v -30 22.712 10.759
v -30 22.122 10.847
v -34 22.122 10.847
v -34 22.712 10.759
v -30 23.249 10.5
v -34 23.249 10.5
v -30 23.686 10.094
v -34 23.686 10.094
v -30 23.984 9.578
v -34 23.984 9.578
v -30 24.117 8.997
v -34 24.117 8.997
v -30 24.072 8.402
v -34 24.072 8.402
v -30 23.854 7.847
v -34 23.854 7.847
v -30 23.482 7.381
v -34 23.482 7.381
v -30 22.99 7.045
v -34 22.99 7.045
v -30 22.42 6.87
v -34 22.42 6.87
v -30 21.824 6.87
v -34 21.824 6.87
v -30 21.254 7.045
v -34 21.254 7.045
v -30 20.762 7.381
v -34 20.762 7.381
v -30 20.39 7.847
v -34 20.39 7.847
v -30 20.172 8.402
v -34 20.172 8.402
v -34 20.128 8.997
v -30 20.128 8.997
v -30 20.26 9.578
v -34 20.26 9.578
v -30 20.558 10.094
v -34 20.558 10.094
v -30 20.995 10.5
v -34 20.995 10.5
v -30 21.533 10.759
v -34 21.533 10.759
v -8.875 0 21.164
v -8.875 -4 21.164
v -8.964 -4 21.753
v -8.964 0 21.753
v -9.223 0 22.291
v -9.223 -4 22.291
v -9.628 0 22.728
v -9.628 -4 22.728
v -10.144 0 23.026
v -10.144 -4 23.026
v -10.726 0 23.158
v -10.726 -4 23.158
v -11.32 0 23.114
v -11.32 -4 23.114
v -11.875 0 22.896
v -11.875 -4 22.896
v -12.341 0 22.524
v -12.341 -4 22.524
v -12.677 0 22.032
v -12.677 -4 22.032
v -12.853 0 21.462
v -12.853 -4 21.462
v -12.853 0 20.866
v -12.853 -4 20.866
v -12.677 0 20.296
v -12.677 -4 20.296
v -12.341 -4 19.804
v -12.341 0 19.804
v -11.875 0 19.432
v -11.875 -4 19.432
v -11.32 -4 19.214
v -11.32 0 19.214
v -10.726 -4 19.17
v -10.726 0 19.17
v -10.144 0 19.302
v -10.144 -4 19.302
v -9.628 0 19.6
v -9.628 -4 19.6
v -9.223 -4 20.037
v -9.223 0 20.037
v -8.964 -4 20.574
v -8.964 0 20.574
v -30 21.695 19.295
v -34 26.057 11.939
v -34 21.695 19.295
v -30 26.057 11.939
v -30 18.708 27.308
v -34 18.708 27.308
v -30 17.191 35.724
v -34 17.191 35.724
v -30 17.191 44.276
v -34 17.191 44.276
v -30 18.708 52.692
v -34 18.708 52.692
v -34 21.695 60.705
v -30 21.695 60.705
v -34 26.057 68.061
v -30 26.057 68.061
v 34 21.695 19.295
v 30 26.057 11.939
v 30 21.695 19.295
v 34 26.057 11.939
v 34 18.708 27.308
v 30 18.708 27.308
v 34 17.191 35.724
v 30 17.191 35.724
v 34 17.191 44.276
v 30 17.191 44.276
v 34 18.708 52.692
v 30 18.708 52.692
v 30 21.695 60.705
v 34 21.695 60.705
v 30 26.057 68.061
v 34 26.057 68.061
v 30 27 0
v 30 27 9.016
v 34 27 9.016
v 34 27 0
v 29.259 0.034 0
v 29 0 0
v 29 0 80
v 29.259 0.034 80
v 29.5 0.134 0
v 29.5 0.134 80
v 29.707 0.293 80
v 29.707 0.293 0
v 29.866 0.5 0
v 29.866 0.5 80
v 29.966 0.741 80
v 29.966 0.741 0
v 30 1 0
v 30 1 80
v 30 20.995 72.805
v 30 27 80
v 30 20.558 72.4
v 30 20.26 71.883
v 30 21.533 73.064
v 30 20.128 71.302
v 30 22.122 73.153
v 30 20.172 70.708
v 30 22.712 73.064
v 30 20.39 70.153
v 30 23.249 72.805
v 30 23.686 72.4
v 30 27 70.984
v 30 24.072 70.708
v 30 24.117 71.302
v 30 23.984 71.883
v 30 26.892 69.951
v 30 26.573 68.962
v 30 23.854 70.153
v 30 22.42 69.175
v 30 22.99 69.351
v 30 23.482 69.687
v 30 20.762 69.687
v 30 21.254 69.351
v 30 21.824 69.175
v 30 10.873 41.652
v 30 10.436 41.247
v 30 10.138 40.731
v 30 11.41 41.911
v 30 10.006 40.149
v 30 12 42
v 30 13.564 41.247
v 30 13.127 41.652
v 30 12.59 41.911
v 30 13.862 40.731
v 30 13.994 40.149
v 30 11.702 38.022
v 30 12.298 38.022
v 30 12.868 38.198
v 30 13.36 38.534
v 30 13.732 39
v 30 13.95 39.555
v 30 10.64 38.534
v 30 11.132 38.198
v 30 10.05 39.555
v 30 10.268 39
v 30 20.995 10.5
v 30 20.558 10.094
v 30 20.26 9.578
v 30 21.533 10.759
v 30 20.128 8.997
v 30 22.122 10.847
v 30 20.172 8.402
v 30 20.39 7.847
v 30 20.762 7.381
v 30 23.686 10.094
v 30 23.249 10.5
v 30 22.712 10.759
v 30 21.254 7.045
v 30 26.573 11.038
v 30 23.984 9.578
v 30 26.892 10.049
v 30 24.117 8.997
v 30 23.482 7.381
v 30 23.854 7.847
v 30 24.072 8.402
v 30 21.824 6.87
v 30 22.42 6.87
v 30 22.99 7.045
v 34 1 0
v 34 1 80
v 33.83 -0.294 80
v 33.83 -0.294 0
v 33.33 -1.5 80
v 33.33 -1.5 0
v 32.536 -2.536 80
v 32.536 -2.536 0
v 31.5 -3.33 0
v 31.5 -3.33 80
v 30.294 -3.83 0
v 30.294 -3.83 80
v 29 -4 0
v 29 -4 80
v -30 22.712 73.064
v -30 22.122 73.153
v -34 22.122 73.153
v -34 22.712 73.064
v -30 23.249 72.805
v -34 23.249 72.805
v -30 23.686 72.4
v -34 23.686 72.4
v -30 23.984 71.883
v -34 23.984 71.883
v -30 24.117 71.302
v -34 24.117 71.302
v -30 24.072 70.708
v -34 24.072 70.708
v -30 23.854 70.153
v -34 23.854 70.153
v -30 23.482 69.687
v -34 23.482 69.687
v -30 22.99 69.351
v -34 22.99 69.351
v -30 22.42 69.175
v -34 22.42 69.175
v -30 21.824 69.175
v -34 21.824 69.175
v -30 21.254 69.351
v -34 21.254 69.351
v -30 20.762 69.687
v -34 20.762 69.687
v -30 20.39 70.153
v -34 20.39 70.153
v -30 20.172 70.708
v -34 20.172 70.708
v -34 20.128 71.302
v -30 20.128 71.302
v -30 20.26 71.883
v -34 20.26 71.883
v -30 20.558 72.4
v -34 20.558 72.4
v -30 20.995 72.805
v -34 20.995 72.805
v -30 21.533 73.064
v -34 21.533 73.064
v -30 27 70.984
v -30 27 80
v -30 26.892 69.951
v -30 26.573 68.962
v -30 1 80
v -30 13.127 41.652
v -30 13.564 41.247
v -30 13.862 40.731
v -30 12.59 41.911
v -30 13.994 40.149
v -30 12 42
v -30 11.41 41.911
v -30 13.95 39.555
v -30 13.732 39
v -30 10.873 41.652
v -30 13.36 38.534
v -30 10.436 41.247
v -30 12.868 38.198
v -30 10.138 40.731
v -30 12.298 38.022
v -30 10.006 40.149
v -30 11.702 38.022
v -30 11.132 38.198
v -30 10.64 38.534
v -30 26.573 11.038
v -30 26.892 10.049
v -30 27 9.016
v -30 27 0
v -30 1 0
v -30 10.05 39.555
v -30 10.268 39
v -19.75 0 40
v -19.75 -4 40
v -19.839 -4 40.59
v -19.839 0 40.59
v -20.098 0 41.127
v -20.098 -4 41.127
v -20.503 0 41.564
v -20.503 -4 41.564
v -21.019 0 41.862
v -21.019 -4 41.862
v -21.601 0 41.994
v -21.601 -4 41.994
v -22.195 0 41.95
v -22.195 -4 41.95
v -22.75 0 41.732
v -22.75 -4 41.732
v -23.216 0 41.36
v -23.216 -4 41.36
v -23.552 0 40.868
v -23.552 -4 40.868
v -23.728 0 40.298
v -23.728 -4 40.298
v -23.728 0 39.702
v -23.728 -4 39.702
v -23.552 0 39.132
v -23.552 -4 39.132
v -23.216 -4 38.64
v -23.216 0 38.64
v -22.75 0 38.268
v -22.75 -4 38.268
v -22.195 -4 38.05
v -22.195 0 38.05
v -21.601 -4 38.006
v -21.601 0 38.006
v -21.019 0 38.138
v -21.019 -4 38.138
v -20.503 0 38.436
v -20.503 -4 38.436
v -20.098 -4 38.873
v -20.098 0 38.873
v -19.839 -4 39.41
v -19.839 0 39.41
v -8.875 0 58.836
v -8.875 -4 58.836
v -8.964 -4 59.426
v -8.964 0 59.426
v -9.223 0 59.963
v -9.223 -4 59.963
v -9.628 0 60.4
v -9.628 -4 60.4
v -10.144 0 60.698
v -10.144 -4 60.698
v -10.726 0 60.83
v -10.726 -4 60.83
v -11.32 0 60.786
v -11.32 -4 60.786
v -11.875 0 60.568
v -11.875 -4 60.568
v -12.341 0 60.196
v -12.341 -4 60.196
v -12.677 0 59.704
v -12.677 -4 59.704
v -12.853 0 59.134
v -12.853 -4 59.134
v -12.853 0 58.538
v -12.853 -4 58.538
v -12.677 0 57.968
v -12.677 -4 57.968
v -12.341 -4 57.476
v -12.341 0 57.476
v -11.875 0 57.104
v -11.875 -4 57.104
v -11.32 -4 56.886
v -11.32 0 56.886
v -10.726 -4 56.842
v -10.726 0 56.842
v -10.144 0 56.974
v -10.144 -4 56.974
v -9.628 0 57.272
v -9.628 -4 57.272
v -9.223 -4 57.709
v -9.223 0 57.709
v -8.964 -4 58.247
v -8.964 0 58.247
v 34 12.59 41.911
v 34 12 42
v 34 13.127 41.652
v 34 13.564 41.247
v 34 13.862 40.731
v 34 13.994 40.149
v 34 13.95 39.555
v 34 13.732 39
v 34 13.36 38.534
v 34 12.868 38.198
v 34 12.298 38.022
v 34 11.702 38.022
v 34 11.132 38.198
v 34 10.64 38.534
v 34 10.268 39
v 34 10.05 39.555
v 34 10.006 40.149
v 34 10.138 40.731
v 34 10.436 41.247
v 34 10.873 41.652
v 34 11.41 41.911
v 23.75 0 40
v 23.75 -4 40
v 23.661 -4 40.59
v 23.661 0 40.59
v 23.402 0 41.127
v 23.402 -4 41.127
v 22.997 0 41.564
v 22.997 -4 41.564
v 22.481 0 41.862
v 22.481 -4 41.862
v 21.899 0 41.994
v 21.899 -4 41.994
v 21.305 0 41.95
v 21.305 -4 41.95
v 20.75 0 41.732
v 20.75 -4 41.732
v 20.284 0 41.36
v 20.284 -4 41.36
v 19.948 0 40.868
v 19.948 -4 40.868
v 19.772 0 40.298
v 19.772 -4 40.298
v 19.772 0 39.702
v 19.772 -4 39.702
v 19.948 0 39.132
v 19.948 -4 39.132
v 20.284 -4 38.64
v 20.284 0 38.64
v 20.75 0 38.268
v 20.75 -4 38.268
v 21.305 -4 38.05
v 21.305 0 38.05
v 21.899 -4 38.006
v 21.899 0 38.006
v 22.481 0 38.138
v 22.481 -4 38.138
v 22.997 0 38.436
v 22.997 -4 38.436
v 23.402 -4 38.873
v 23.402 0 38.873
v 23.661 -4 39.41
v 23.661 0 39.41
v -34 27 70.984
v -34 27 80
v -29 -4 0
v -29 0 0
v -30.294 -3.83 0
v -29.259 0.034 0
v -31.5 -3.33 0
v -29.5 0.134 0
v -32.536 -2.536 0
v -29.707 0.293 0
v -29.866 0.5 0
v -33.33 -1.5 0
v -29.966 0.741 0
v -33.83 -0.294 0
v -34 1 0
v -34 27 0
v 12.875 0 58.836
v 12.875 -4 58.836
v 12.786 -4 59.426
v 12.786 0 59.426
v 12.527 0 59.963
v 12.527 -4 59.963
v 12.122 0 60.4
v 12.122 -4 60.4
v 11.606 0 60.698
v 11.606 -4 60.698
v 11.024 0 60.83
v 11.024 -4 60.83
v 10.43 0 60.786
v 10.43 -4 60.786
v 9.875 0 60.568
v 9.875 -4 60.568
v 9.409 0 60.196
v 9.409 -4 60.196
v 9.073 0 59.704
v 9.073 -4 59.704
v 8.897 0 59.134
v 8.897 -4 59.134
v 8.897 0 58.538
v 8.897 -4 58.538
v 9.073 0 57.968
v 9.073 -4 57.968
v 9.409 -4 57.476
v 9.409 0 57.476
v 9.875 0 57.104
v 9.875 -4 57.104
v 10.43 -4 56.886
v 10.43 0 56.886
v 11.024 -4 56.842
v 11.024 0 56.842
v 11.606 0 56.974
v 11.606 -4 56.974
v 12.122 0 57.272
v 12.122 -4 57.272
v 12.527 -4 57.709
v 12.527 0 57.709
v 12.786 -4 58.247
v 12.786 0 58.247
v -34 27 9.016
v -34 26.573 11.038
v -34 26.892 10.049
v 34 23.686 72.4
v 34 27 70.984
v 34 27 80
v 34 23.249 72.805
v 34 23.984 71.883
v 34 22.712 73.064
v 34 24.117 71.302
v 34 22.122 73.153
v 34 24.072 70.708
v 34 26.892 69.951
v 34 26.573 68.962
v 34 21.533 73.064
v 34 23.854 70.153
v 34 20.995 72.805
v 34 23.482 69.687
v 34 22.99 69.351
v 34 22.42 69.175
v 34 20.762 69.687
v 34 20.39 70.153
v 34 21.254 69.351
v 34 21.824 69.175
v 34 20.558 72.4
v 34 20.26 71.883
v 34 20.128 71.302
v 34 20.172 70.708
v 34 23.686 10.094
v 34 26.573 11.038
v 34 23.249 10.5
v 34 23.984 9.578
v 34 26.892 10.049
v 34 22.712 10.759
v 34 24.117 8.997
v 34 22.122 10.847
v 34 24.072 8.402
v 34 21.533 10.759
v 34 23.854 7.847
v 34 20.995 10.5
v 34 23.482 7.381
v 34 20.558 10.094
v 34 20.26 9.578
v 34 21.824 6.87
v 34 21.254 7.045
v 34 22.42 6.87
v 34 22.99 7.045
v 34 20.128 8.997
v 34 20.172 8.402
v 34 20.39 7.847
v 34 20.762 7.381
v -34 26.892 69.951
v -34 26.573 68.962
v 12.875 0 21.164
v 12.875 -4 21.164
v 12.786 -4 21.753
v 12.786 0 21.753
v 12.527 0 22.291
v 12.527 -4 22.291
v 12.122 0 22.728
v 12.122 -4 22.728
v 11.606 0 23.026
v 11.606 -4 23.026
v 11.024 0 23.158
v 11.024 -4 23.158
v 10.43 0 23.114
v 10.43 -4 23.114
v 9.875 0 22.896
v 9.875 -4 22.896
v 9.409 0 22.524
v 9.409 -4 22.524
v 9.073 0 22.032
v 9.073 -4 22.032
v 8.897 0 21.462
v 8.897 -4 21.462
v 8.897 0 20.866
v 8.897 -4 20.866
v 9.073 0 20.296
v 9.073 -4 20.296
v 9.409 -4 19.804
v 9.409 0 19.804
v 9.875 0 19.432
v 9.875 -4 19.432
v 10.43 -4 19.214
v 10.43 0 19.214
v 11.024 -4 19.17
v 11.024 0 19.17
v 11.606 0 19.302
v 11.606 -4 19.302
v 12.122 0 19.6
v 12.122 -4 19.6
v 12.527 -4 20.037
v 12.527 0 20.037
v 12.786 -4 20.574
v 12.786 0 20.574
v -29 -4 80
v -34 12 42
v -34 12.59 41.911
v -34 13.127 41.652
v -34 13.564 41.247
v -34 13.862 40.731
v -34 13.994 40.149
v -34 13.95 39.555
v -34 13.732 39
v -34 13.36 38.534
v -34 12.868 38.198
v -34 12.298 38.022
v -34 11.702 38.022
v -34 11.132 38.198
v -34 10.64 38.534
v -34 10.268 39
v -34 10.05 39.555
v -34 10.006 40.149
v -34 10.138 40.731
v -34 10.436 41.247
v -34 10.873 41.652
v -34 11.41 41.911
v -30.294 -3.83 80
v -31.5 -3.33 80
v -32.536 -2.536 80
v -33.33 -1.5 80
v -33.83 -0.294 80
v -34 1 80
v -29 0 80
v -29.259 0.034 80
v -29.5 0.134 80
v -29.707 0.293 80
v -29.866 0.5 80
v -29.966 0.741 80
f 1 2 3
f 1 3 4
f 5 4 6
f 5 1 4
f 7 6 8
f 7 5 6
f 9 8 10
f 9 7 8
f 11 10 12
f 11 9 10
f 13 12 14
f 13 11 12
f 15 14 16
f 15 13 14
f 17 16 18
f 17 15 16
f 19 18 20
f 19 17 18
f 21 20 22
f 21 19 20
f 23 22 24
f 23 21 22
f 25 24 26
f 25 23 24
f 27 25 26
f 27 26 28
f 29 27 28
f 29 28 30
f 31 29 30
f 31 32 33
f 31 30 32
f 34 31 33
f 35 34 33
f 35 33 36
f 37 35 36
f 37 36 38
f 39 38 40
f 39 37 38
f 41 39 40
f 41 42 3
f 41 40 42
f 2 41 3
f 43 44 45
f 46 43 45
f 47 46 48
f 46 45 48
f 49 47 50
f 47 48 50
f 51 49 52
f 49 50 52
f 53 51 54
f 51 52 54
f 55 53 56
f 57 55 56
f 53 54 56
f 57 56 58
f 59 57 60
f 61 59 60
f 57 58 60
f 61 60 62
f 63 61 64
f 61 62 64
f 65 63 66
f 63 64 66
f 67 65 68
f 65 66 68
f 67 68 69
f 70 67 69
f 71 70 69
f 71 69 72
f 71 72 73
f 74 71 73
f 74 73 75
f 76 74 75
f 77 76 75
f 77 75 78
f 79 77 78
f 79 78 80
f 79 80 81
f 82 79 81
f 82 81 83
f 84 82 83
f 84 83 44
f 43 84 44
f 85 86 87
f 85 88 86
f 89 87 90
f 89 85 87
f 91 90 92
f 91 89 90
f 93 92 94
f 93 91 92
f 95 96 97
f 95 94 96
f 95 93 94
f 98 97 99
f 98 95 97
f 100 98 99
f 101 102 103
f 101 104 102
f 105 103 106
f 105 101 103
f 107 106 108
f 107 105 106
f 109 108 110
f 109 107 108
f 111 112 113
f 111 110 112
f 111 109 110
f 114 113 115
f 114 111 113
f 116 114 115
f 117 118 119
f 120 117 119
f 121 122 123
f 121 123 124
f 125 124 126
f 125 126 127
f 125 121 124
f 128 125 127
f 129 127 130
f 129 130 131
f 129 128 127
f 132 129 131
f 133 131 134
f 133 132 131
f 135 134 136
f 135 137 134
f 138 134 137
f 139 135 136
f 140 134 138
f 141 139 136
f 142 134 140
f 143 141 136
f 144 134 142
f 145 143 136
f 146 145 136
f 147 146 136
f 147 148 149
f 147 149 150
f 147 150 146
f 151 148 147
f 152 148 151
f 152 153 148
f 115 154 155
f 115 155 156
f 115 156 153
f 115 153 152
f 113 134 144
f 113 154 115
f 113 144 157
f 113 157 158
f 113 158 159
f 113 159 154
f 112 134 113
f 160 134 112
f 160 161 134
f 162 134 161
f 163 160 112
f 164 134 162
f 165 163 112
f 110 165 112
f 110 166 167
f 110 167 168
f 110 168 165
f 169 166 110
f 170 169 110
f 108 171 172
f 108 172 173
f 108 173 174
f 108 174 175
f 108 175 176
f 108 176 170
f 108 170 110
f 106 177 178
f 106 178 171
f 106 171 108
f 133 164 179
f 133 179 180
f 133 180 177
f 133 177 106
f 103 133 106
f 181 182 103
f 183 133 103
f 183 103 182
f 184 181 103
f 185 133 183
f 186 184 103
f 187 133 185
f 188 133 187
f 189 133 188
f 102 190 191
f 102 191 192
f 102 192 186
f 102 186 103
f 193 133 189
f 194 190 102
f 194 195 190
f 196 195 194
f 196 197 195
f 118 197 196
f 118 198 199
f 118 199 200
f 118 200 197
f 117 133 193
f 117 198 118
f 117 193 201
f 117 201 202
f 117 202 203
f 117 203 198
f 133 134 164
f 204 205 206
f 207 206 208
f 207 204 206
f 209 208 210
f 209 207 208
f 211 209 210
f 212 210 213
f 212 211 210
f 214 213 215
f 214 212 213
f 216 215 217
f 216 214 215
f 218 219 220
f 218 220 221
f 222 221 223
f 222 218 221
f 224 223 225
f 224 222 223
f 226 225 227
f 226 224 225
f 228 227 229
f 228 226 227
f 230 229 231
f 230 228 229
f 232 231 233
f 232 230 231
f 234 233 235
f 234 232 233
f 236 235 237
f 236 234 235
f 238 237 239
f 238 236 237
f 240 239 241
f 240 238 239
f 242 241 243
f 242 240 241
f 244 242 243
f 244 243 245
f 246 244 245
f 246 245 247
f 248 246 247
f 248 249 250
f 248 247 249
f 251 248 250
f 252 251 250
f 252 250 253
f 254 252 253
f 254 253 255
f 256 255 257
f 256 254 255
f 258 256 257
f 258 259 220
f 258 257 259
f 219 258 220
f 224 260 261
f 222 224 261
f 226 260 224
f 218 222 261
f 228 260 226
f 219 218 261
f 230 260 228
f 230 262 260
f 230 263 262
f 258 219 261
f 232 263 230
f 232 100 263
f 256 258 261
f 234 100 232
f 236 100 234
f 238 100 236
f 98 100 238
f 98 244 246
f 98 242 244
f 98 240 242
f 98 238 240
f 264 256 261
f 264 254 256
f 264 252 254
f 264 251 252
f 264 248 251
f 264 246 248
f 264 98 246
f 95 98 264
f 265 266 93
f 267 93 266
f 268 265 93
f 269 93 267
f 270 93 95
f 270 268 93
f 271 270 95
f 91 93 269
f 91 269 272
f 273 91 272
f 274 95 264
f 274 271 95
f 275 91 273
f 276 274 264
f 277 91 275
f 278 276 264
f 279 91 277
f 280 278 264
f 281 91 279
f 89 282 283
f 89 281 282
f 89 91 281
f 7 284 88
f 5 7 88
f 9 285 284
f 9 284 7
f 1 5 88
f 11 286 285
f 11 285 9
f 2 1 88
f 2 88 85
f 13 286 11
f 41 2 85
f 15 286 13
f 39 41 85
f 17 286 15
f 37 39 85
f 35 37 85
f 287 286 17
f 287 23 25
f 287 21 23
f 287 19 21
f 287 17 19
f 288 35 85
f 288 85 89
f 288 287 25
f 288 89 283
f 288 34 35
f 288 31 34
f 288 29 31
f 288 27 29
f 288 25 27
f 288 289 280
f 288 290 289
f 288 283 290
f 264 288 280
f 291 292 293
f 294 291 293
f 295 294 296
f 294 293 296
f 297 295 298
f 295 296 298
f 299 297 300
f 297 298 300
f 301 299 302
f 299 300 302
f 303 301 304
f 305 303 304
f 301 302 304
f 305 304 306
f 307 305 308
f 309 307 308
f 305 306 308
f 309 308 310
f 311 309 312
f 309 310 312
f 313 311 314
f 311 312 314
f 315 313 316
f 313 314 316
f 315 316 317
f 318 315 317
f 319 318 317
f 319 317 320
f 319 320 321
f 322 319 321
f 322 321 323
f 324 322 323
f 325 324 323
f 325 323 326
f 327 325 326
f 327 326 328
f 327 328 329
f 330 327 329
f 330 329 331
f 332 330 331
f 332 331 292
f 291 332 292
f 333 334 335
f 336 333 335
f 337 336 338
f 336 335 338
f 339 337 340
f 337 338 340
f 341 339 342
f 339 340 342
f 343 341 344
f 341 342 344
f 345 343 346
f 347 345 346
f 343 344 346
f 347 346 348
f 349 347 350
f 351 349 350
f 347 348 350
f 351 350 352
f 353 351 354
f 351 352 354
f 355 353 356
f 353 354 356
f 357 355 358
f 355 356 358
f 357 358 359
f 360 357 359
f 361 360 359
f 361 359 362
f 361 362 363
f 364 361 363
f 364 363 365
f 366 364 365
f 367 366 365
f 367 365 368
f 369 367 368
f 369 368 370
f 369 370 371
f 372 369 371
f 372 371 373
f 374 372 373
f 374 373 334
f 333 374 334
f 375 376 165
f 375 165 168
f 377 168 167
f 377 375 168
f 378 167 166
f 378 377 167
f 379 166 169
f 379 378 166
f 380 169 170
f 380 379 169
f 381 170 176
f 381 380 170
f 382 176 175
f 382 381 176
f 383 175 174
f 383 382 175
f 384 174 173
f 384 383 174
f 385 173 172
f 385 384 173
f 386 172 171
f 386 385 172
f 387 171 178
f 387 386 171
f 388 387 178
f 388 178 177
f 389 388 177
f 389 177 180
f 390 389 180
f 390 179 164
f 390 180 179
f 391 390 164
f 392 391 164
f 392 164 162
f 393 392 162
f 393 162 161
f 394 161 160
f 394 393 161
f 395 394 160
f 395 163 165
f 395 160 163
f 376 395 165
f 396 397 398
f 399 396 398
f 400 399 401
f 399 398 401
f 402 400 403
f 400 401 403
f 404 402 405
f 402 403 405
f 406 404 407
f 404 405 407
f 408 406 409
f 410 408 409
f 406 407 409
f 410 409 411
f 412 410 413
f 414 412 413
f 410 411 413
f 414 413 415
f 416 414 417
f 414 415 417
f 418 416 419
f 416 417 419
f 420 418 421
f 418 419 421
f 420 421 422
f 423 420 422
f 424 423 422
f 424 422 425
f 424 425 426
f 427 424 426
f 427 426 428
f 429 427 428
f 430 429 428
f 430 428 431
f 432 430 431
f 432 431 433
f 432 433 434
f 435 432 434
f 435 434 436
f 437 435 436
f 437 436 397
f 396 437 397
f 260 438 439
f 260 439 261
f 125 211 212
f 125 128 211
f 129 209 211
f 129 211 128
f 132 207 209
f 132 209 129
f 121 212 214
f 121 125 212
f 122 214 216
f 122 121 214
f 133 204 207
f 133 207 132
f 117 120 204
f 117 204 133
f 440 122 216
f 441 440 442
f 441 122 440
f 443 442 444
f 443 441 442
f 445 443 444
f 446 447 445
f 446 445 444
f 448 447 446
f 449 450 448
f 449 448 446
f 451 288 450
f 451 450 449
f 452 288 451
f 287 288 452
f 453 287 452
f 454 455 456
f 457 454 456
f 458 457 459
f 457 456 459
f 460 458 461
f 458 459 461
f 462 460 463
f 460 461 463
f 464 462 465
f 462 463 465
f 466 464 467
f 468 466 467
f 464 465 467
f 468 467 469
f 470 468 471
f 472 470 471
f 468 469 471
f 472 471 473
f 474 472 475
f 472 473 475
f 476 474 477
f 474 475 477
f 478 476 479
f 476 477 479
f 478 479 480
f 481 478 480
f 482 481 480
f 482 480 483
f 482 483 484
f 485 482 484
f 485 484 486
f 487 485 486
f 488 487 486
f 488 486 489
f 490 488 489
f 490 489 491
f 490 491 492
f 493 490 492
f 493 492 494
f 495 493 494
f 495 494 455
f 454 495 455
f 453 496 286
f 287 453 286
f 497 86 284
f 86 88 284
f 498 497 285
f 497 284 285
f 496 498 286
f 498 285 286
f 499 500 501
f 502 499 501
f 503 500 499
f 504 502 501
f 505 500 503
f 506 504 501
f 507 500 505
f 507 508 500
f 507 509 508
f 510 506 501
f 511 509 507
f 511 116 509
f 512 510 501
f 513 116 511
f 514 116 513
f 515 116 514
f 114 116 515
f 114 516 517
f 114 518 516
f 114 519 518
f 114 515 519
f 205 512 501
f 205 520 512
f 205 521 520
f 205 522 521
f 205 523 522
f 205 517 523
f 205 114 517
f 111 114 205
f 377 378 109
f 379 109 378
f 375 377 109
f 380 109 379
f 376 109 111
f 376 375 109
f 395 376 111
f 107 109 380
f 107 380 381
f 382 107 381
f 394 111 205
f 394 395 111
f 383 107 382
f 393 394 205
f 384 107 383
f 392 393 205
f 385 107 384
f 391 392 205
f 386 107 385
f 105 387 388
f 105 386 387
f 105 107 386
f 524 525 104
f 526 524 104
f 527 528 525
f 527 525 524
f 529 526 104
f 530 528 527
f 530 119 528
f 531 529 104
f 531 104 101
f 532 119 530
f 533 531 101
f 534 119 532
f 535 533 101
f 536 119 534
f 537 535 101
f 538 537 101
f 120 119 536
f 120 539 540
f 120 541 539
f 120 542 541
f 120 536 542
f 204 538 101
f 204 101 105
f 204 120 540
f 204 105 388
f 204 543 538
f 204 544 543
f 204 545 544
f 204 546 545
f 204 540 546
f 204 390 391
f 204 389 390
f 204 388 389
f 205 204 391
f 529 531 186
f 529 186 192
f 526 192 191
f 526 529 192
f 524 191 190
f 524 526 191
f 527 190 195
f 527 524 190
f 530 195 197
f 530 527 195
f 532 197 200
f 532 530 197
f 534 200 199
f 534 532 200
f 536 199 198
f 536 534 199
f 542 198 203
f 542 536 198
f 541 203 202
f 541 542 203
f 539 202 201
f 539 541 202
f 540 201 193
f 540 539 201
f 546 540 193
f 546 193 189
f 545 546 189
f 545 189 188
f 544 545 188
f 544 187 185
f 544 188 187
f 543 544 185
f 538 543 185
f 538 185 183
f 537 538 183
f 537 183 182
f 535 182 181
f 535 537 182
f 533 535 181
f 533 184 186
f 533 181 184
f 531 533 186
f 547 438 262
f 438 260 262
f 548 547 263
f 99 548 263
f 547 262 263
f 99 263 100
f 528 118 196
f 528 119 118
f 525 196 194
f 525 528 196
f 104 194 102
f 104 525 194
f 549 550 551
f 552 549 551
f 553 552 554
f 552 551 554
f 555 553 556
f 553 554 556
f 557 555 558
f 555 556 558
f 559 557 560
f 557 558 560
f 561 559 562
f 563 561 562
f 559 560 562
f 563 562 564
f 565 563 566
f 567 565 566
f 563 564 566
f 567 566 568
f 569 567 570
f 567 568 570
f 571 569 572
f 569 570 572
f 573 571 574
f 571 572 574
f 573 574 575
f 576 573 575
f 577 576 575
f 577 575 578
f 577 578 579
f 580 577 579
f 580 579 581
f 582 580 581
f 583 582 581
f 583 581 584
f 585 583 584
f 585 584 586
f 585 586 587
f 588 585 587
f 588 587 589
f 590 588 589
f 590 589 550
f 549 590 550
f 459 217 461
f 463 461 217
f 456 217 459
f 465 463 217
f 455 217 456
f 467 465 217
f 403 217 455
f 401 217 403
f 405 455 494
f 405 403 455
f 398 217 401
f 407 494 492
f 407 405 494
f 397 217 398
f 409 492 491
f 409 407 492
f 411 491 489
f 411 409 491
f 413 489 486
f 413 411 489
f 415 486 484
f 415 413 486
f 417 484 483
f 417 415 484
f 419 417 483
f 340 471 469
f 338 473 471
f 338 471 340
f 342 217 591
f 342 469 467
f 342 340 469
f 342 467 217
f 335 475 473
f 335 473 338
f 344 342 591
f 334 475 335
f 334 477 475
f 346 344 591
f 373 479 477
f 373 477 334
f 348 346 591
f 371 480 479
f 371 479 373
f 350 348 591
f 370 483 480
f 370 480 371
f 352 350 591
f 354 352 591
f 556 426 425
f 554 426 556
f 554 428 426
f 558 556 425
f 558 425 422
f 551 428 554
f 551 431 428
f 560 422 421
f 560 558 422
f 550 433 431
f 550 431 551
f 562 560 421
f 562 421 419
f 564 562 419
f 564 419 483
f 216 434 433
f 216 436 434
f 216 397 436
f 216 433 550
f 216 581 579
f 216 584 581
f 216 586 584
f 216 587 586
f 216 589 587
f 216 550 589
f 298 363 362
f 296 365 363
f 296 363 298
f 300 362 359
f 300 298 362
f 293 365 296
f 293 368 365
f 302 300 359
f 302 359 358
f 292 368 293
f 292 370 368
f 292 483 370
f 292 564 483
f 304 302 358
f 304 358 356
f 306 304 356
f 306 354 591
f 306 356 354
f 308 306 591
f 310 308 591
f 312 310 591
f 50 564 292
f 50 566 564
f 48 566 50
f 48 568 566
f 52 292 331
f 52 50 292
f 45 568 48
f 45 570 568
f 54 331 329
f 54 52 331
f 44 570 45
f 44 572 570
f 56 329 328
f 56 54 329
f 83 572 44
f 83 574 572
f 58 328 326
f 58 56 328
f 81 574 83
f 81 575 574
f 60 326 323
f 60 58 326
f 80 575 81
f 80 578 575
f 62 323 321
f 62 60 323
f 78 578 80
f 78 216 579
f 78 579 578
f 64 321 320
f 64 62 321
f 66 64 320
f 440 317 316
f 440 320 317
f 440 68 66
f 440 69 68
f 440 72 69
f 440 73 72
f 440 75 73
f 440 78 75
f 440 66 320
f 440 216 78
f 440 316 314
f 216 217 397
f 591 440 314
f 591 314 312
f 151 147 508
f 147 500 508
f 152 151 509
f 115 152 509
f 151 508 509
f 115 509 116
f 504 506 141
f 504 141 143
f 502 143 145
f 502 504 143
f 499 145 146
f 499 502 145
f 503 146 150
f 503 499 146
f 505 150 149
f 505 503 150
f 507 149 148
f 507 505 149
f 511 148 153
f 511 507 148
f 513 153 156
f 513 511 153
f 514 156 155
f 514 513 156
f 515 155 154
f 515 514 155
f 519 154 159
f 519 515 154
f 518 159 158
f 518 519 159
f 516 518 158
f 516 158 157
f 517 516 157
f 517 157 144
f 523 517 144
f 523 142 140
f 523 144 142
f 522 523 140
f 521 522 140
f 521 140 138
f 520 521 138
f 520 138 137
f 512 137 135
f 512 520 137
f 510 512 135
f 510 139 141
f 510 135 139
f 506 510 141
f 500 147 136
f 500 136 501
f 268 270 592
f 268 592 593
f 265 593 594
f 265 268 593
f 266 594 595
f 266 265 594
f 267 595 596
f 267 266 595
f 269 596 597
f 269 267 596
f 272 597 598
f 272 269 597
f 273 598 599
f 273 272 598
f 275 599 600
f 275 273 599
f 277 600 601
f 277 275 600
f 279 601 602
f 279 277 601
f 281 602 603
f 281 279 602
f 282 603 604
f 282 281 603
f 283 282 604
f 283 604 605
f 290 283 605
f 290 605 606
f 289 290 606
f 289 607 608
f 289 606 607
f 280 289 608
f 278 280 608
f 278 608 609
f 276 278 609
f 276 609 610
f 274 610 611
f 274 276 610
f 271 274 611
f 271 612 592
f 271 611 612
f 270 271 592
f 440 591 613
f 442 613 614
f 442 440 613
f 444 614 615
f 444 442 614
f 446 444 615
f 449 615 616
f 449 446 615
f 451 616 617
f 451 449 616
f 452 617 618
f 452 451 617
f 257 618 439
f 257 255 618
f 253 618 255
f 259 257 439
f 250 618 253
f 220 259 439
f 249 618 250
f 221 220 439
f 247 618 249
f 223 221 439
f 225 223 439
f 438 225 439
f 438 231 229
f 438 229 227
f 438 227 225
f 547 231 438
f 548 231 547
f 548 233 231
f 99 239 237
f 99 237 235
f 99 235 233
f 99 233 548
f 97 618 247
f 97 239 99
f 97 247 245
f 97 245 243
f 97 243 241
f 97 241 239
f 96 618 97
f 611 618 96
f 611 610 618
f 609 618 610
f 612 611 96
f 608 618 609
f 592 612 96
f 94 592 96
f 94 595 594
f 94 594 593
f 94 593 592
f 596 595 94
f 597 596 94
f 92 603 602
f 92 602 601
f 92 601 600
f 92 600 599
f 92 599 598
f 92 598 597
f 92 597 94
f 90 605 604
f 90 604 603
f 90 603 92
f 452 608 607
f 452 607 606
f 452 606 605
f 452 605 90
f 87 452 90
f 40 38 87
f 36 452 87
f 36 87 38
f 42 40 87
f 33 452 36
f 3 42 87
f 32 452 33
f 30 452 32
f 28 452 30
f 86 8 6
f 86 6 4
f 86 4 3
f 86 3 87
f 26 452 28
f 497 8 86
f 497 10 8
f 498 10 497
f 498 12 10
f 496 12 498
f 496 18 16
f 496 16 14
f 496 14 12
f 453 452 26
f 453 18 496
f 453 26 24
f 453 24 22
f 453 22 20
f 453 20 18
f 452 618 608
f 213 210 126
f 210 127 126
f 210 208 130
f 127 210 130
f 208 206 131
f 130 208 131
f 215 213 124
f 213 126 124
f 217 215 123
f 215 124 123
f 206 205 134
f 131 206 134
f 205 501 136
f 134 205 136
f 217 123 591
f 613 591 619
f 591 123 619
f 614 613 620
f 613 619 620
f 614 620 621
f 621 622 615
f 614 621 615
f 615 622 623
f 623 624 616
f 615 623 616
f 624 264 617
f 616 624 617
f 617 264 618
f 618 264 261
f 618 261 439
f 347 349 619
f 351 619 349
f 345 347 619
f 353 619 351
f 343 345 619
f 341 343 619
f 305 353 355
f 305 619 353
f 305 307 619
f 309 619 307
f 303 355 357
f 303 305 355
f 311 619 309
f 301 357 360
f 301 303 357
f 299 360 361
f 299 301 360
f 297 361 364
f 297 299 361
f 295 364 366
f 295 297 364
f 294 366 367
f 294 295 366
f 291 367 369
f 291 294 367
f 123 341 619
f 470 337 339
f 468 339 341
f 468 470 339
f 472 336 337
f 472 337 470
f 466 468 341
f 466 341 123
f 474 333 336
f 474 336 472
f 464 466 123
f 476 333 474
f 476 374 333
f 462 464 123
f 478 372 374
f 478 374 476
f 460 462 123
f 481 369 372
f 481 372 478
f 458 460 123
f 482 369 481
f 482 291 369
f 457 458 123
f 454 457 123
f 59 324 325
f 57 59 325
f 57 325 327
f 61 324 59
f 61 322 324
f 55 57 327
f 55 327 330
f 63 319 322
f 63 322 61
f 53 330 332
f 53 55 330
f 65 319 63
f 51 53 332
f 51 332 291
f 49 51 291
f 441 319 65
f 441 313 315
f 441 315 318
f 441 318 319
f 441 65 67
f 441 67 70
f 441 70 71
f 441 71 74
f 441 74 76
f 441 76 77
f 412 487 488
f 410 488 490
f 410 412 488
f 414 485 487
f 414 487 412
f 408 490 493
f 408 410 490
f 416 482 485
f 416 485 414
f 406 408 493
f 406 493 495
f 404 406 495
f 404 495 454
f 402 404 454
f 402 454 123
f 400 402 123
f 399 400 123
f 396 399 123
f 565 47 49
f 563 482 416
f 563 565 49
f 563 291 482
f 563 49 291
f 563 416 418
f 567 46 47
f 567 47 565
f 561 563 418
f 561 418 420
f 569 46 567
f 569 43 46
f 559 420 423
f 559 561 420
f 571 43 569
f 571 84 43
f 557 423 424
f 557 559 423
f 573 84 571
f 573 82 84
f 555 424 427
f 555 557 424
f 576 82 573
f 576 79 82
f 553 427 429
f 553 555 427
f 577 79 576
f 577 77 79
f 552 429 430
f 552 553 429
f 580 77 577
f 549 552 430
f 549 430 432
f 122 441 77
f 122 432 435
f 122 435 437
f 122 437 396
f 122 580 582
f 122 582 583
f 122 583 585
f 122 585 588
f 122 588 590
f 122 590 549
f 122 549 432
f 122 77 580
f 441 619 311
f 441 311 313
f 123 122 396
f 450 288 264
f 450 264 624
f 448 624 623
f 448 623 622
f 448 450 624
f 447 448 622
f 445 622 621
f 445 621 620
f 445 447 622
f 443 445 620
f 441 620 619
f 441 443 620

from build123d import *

# Parameters (mm, degrees)
SM_BASE_FLANGE_1_DEPTH   = 80
CUT_EXTRUDE_3_DEPTH      = 109.411254028
CUT_EXTRUDE_3_DEPTH_BACK = 109.411254028
SKETCH_6_R               = 48
SKETCH_6_R_2             = 2
FILLET_1_R               = 5
SKETCH_9_R               = 2
CUT_EXTRUDE_4_DEPTH      = 93.287593966


# Sheet-metal steps are written as plain solids
with BuildPart() as part:
    # Sketch 1 → Базовая кромка1 (new body)
    with BuildSketch(Plane.XY):
        with BuildLine():
            Line((-30, 27), (-30, 1))
            ThreePointArc((-30, 1), (-29.707106781, 0.292893219), (-29, 0))
            Line((-29, 0), (29, 0))
            ThreePointArc((29, 0), (29.707106781, 0.292893219), (30, 1))
            Line((30, 1), (30, 27))
            Line((30, 27), (34, 27))
            Line((34, 27), (34, 1))
            ThreePointArc((34, 1), (32.535533906, -2.535533906), (29, -4))
            Line((29, -4), (-29, -4))
            ThreePointArc((-29, -4), (-32.535533906, -2.535533906), (-34, 1))
            Line((-34, 1), (-34, 27))
            Line((-34, 27), (-30, 27))
        make_face()
    extrude(amount=SM_BASE_FLANGE_1_DEPTH)

    # Эскиз6 → Вырез-Вытянуть3 (cut, two sides: drawn at the far end of the back side and taken through both)
    with BuildSketch(Plane.ZY.offset(34).offset(-CUT_EXTRUDE_3_DEPTH_BACK)):
        with Locations((40, 65)):
            Circle(SKETCH_6_R)
        with Locations((40, 12)):
            Circle(SKETCH_6_R_2)
        with Locations((8.847381628, 22.122099298)):
            Circle(SKETCH_6_R_2)
        with Locations((71.152618372, 22.122099298)):
            Circle(SKETCH_6_R_2)
    extrude(amount=CUT_EXTRUDE_3_DEPTH + CUT_EXTRUDE_3_DEPTH_BACK, mode=Mode.SUBTRACT)

    # Скругление1
    fillet_1_edges = [part.edges().sort_by_distance(p)[0] for p in [
        (32, 27, 10.674243403),
        (32, 27, 69.325756597),
        (-32, 27, 10.674243403),
        (-32, 27, 69.325756597),
    ]]
    fillet(fillet_1_edges, radius=FILLET_1_R)

    # Эскиз9 → Вырез-Вытянуть4 (cut, through all)
    with BuildSketch(Plane.XZ.offset(4)):
        with Locations((-21.75, 40)):
            Circle(SKETCH_9_R)
        with Locations((-10.875, 58.836052532)):
            Circle(SKETCH_9_R)
        with Locations((10.875, 58.836052532)):
            Circle(SKETCH_9_R)
        with Locations((21.75, 40)):
            Circle(SKETCH_9_R)
        with Locations((10.875, 21.163947468)):
            Circle(SKETCH_9_R)
        with Locations((-10.875, 21.163947468)):
            Circle(SKETCH_9_R)
    extrude(amount=-CUT_EXTRUDE_4_DEPTH, mode=Mode.SUBTRACT)


solid = part.part
